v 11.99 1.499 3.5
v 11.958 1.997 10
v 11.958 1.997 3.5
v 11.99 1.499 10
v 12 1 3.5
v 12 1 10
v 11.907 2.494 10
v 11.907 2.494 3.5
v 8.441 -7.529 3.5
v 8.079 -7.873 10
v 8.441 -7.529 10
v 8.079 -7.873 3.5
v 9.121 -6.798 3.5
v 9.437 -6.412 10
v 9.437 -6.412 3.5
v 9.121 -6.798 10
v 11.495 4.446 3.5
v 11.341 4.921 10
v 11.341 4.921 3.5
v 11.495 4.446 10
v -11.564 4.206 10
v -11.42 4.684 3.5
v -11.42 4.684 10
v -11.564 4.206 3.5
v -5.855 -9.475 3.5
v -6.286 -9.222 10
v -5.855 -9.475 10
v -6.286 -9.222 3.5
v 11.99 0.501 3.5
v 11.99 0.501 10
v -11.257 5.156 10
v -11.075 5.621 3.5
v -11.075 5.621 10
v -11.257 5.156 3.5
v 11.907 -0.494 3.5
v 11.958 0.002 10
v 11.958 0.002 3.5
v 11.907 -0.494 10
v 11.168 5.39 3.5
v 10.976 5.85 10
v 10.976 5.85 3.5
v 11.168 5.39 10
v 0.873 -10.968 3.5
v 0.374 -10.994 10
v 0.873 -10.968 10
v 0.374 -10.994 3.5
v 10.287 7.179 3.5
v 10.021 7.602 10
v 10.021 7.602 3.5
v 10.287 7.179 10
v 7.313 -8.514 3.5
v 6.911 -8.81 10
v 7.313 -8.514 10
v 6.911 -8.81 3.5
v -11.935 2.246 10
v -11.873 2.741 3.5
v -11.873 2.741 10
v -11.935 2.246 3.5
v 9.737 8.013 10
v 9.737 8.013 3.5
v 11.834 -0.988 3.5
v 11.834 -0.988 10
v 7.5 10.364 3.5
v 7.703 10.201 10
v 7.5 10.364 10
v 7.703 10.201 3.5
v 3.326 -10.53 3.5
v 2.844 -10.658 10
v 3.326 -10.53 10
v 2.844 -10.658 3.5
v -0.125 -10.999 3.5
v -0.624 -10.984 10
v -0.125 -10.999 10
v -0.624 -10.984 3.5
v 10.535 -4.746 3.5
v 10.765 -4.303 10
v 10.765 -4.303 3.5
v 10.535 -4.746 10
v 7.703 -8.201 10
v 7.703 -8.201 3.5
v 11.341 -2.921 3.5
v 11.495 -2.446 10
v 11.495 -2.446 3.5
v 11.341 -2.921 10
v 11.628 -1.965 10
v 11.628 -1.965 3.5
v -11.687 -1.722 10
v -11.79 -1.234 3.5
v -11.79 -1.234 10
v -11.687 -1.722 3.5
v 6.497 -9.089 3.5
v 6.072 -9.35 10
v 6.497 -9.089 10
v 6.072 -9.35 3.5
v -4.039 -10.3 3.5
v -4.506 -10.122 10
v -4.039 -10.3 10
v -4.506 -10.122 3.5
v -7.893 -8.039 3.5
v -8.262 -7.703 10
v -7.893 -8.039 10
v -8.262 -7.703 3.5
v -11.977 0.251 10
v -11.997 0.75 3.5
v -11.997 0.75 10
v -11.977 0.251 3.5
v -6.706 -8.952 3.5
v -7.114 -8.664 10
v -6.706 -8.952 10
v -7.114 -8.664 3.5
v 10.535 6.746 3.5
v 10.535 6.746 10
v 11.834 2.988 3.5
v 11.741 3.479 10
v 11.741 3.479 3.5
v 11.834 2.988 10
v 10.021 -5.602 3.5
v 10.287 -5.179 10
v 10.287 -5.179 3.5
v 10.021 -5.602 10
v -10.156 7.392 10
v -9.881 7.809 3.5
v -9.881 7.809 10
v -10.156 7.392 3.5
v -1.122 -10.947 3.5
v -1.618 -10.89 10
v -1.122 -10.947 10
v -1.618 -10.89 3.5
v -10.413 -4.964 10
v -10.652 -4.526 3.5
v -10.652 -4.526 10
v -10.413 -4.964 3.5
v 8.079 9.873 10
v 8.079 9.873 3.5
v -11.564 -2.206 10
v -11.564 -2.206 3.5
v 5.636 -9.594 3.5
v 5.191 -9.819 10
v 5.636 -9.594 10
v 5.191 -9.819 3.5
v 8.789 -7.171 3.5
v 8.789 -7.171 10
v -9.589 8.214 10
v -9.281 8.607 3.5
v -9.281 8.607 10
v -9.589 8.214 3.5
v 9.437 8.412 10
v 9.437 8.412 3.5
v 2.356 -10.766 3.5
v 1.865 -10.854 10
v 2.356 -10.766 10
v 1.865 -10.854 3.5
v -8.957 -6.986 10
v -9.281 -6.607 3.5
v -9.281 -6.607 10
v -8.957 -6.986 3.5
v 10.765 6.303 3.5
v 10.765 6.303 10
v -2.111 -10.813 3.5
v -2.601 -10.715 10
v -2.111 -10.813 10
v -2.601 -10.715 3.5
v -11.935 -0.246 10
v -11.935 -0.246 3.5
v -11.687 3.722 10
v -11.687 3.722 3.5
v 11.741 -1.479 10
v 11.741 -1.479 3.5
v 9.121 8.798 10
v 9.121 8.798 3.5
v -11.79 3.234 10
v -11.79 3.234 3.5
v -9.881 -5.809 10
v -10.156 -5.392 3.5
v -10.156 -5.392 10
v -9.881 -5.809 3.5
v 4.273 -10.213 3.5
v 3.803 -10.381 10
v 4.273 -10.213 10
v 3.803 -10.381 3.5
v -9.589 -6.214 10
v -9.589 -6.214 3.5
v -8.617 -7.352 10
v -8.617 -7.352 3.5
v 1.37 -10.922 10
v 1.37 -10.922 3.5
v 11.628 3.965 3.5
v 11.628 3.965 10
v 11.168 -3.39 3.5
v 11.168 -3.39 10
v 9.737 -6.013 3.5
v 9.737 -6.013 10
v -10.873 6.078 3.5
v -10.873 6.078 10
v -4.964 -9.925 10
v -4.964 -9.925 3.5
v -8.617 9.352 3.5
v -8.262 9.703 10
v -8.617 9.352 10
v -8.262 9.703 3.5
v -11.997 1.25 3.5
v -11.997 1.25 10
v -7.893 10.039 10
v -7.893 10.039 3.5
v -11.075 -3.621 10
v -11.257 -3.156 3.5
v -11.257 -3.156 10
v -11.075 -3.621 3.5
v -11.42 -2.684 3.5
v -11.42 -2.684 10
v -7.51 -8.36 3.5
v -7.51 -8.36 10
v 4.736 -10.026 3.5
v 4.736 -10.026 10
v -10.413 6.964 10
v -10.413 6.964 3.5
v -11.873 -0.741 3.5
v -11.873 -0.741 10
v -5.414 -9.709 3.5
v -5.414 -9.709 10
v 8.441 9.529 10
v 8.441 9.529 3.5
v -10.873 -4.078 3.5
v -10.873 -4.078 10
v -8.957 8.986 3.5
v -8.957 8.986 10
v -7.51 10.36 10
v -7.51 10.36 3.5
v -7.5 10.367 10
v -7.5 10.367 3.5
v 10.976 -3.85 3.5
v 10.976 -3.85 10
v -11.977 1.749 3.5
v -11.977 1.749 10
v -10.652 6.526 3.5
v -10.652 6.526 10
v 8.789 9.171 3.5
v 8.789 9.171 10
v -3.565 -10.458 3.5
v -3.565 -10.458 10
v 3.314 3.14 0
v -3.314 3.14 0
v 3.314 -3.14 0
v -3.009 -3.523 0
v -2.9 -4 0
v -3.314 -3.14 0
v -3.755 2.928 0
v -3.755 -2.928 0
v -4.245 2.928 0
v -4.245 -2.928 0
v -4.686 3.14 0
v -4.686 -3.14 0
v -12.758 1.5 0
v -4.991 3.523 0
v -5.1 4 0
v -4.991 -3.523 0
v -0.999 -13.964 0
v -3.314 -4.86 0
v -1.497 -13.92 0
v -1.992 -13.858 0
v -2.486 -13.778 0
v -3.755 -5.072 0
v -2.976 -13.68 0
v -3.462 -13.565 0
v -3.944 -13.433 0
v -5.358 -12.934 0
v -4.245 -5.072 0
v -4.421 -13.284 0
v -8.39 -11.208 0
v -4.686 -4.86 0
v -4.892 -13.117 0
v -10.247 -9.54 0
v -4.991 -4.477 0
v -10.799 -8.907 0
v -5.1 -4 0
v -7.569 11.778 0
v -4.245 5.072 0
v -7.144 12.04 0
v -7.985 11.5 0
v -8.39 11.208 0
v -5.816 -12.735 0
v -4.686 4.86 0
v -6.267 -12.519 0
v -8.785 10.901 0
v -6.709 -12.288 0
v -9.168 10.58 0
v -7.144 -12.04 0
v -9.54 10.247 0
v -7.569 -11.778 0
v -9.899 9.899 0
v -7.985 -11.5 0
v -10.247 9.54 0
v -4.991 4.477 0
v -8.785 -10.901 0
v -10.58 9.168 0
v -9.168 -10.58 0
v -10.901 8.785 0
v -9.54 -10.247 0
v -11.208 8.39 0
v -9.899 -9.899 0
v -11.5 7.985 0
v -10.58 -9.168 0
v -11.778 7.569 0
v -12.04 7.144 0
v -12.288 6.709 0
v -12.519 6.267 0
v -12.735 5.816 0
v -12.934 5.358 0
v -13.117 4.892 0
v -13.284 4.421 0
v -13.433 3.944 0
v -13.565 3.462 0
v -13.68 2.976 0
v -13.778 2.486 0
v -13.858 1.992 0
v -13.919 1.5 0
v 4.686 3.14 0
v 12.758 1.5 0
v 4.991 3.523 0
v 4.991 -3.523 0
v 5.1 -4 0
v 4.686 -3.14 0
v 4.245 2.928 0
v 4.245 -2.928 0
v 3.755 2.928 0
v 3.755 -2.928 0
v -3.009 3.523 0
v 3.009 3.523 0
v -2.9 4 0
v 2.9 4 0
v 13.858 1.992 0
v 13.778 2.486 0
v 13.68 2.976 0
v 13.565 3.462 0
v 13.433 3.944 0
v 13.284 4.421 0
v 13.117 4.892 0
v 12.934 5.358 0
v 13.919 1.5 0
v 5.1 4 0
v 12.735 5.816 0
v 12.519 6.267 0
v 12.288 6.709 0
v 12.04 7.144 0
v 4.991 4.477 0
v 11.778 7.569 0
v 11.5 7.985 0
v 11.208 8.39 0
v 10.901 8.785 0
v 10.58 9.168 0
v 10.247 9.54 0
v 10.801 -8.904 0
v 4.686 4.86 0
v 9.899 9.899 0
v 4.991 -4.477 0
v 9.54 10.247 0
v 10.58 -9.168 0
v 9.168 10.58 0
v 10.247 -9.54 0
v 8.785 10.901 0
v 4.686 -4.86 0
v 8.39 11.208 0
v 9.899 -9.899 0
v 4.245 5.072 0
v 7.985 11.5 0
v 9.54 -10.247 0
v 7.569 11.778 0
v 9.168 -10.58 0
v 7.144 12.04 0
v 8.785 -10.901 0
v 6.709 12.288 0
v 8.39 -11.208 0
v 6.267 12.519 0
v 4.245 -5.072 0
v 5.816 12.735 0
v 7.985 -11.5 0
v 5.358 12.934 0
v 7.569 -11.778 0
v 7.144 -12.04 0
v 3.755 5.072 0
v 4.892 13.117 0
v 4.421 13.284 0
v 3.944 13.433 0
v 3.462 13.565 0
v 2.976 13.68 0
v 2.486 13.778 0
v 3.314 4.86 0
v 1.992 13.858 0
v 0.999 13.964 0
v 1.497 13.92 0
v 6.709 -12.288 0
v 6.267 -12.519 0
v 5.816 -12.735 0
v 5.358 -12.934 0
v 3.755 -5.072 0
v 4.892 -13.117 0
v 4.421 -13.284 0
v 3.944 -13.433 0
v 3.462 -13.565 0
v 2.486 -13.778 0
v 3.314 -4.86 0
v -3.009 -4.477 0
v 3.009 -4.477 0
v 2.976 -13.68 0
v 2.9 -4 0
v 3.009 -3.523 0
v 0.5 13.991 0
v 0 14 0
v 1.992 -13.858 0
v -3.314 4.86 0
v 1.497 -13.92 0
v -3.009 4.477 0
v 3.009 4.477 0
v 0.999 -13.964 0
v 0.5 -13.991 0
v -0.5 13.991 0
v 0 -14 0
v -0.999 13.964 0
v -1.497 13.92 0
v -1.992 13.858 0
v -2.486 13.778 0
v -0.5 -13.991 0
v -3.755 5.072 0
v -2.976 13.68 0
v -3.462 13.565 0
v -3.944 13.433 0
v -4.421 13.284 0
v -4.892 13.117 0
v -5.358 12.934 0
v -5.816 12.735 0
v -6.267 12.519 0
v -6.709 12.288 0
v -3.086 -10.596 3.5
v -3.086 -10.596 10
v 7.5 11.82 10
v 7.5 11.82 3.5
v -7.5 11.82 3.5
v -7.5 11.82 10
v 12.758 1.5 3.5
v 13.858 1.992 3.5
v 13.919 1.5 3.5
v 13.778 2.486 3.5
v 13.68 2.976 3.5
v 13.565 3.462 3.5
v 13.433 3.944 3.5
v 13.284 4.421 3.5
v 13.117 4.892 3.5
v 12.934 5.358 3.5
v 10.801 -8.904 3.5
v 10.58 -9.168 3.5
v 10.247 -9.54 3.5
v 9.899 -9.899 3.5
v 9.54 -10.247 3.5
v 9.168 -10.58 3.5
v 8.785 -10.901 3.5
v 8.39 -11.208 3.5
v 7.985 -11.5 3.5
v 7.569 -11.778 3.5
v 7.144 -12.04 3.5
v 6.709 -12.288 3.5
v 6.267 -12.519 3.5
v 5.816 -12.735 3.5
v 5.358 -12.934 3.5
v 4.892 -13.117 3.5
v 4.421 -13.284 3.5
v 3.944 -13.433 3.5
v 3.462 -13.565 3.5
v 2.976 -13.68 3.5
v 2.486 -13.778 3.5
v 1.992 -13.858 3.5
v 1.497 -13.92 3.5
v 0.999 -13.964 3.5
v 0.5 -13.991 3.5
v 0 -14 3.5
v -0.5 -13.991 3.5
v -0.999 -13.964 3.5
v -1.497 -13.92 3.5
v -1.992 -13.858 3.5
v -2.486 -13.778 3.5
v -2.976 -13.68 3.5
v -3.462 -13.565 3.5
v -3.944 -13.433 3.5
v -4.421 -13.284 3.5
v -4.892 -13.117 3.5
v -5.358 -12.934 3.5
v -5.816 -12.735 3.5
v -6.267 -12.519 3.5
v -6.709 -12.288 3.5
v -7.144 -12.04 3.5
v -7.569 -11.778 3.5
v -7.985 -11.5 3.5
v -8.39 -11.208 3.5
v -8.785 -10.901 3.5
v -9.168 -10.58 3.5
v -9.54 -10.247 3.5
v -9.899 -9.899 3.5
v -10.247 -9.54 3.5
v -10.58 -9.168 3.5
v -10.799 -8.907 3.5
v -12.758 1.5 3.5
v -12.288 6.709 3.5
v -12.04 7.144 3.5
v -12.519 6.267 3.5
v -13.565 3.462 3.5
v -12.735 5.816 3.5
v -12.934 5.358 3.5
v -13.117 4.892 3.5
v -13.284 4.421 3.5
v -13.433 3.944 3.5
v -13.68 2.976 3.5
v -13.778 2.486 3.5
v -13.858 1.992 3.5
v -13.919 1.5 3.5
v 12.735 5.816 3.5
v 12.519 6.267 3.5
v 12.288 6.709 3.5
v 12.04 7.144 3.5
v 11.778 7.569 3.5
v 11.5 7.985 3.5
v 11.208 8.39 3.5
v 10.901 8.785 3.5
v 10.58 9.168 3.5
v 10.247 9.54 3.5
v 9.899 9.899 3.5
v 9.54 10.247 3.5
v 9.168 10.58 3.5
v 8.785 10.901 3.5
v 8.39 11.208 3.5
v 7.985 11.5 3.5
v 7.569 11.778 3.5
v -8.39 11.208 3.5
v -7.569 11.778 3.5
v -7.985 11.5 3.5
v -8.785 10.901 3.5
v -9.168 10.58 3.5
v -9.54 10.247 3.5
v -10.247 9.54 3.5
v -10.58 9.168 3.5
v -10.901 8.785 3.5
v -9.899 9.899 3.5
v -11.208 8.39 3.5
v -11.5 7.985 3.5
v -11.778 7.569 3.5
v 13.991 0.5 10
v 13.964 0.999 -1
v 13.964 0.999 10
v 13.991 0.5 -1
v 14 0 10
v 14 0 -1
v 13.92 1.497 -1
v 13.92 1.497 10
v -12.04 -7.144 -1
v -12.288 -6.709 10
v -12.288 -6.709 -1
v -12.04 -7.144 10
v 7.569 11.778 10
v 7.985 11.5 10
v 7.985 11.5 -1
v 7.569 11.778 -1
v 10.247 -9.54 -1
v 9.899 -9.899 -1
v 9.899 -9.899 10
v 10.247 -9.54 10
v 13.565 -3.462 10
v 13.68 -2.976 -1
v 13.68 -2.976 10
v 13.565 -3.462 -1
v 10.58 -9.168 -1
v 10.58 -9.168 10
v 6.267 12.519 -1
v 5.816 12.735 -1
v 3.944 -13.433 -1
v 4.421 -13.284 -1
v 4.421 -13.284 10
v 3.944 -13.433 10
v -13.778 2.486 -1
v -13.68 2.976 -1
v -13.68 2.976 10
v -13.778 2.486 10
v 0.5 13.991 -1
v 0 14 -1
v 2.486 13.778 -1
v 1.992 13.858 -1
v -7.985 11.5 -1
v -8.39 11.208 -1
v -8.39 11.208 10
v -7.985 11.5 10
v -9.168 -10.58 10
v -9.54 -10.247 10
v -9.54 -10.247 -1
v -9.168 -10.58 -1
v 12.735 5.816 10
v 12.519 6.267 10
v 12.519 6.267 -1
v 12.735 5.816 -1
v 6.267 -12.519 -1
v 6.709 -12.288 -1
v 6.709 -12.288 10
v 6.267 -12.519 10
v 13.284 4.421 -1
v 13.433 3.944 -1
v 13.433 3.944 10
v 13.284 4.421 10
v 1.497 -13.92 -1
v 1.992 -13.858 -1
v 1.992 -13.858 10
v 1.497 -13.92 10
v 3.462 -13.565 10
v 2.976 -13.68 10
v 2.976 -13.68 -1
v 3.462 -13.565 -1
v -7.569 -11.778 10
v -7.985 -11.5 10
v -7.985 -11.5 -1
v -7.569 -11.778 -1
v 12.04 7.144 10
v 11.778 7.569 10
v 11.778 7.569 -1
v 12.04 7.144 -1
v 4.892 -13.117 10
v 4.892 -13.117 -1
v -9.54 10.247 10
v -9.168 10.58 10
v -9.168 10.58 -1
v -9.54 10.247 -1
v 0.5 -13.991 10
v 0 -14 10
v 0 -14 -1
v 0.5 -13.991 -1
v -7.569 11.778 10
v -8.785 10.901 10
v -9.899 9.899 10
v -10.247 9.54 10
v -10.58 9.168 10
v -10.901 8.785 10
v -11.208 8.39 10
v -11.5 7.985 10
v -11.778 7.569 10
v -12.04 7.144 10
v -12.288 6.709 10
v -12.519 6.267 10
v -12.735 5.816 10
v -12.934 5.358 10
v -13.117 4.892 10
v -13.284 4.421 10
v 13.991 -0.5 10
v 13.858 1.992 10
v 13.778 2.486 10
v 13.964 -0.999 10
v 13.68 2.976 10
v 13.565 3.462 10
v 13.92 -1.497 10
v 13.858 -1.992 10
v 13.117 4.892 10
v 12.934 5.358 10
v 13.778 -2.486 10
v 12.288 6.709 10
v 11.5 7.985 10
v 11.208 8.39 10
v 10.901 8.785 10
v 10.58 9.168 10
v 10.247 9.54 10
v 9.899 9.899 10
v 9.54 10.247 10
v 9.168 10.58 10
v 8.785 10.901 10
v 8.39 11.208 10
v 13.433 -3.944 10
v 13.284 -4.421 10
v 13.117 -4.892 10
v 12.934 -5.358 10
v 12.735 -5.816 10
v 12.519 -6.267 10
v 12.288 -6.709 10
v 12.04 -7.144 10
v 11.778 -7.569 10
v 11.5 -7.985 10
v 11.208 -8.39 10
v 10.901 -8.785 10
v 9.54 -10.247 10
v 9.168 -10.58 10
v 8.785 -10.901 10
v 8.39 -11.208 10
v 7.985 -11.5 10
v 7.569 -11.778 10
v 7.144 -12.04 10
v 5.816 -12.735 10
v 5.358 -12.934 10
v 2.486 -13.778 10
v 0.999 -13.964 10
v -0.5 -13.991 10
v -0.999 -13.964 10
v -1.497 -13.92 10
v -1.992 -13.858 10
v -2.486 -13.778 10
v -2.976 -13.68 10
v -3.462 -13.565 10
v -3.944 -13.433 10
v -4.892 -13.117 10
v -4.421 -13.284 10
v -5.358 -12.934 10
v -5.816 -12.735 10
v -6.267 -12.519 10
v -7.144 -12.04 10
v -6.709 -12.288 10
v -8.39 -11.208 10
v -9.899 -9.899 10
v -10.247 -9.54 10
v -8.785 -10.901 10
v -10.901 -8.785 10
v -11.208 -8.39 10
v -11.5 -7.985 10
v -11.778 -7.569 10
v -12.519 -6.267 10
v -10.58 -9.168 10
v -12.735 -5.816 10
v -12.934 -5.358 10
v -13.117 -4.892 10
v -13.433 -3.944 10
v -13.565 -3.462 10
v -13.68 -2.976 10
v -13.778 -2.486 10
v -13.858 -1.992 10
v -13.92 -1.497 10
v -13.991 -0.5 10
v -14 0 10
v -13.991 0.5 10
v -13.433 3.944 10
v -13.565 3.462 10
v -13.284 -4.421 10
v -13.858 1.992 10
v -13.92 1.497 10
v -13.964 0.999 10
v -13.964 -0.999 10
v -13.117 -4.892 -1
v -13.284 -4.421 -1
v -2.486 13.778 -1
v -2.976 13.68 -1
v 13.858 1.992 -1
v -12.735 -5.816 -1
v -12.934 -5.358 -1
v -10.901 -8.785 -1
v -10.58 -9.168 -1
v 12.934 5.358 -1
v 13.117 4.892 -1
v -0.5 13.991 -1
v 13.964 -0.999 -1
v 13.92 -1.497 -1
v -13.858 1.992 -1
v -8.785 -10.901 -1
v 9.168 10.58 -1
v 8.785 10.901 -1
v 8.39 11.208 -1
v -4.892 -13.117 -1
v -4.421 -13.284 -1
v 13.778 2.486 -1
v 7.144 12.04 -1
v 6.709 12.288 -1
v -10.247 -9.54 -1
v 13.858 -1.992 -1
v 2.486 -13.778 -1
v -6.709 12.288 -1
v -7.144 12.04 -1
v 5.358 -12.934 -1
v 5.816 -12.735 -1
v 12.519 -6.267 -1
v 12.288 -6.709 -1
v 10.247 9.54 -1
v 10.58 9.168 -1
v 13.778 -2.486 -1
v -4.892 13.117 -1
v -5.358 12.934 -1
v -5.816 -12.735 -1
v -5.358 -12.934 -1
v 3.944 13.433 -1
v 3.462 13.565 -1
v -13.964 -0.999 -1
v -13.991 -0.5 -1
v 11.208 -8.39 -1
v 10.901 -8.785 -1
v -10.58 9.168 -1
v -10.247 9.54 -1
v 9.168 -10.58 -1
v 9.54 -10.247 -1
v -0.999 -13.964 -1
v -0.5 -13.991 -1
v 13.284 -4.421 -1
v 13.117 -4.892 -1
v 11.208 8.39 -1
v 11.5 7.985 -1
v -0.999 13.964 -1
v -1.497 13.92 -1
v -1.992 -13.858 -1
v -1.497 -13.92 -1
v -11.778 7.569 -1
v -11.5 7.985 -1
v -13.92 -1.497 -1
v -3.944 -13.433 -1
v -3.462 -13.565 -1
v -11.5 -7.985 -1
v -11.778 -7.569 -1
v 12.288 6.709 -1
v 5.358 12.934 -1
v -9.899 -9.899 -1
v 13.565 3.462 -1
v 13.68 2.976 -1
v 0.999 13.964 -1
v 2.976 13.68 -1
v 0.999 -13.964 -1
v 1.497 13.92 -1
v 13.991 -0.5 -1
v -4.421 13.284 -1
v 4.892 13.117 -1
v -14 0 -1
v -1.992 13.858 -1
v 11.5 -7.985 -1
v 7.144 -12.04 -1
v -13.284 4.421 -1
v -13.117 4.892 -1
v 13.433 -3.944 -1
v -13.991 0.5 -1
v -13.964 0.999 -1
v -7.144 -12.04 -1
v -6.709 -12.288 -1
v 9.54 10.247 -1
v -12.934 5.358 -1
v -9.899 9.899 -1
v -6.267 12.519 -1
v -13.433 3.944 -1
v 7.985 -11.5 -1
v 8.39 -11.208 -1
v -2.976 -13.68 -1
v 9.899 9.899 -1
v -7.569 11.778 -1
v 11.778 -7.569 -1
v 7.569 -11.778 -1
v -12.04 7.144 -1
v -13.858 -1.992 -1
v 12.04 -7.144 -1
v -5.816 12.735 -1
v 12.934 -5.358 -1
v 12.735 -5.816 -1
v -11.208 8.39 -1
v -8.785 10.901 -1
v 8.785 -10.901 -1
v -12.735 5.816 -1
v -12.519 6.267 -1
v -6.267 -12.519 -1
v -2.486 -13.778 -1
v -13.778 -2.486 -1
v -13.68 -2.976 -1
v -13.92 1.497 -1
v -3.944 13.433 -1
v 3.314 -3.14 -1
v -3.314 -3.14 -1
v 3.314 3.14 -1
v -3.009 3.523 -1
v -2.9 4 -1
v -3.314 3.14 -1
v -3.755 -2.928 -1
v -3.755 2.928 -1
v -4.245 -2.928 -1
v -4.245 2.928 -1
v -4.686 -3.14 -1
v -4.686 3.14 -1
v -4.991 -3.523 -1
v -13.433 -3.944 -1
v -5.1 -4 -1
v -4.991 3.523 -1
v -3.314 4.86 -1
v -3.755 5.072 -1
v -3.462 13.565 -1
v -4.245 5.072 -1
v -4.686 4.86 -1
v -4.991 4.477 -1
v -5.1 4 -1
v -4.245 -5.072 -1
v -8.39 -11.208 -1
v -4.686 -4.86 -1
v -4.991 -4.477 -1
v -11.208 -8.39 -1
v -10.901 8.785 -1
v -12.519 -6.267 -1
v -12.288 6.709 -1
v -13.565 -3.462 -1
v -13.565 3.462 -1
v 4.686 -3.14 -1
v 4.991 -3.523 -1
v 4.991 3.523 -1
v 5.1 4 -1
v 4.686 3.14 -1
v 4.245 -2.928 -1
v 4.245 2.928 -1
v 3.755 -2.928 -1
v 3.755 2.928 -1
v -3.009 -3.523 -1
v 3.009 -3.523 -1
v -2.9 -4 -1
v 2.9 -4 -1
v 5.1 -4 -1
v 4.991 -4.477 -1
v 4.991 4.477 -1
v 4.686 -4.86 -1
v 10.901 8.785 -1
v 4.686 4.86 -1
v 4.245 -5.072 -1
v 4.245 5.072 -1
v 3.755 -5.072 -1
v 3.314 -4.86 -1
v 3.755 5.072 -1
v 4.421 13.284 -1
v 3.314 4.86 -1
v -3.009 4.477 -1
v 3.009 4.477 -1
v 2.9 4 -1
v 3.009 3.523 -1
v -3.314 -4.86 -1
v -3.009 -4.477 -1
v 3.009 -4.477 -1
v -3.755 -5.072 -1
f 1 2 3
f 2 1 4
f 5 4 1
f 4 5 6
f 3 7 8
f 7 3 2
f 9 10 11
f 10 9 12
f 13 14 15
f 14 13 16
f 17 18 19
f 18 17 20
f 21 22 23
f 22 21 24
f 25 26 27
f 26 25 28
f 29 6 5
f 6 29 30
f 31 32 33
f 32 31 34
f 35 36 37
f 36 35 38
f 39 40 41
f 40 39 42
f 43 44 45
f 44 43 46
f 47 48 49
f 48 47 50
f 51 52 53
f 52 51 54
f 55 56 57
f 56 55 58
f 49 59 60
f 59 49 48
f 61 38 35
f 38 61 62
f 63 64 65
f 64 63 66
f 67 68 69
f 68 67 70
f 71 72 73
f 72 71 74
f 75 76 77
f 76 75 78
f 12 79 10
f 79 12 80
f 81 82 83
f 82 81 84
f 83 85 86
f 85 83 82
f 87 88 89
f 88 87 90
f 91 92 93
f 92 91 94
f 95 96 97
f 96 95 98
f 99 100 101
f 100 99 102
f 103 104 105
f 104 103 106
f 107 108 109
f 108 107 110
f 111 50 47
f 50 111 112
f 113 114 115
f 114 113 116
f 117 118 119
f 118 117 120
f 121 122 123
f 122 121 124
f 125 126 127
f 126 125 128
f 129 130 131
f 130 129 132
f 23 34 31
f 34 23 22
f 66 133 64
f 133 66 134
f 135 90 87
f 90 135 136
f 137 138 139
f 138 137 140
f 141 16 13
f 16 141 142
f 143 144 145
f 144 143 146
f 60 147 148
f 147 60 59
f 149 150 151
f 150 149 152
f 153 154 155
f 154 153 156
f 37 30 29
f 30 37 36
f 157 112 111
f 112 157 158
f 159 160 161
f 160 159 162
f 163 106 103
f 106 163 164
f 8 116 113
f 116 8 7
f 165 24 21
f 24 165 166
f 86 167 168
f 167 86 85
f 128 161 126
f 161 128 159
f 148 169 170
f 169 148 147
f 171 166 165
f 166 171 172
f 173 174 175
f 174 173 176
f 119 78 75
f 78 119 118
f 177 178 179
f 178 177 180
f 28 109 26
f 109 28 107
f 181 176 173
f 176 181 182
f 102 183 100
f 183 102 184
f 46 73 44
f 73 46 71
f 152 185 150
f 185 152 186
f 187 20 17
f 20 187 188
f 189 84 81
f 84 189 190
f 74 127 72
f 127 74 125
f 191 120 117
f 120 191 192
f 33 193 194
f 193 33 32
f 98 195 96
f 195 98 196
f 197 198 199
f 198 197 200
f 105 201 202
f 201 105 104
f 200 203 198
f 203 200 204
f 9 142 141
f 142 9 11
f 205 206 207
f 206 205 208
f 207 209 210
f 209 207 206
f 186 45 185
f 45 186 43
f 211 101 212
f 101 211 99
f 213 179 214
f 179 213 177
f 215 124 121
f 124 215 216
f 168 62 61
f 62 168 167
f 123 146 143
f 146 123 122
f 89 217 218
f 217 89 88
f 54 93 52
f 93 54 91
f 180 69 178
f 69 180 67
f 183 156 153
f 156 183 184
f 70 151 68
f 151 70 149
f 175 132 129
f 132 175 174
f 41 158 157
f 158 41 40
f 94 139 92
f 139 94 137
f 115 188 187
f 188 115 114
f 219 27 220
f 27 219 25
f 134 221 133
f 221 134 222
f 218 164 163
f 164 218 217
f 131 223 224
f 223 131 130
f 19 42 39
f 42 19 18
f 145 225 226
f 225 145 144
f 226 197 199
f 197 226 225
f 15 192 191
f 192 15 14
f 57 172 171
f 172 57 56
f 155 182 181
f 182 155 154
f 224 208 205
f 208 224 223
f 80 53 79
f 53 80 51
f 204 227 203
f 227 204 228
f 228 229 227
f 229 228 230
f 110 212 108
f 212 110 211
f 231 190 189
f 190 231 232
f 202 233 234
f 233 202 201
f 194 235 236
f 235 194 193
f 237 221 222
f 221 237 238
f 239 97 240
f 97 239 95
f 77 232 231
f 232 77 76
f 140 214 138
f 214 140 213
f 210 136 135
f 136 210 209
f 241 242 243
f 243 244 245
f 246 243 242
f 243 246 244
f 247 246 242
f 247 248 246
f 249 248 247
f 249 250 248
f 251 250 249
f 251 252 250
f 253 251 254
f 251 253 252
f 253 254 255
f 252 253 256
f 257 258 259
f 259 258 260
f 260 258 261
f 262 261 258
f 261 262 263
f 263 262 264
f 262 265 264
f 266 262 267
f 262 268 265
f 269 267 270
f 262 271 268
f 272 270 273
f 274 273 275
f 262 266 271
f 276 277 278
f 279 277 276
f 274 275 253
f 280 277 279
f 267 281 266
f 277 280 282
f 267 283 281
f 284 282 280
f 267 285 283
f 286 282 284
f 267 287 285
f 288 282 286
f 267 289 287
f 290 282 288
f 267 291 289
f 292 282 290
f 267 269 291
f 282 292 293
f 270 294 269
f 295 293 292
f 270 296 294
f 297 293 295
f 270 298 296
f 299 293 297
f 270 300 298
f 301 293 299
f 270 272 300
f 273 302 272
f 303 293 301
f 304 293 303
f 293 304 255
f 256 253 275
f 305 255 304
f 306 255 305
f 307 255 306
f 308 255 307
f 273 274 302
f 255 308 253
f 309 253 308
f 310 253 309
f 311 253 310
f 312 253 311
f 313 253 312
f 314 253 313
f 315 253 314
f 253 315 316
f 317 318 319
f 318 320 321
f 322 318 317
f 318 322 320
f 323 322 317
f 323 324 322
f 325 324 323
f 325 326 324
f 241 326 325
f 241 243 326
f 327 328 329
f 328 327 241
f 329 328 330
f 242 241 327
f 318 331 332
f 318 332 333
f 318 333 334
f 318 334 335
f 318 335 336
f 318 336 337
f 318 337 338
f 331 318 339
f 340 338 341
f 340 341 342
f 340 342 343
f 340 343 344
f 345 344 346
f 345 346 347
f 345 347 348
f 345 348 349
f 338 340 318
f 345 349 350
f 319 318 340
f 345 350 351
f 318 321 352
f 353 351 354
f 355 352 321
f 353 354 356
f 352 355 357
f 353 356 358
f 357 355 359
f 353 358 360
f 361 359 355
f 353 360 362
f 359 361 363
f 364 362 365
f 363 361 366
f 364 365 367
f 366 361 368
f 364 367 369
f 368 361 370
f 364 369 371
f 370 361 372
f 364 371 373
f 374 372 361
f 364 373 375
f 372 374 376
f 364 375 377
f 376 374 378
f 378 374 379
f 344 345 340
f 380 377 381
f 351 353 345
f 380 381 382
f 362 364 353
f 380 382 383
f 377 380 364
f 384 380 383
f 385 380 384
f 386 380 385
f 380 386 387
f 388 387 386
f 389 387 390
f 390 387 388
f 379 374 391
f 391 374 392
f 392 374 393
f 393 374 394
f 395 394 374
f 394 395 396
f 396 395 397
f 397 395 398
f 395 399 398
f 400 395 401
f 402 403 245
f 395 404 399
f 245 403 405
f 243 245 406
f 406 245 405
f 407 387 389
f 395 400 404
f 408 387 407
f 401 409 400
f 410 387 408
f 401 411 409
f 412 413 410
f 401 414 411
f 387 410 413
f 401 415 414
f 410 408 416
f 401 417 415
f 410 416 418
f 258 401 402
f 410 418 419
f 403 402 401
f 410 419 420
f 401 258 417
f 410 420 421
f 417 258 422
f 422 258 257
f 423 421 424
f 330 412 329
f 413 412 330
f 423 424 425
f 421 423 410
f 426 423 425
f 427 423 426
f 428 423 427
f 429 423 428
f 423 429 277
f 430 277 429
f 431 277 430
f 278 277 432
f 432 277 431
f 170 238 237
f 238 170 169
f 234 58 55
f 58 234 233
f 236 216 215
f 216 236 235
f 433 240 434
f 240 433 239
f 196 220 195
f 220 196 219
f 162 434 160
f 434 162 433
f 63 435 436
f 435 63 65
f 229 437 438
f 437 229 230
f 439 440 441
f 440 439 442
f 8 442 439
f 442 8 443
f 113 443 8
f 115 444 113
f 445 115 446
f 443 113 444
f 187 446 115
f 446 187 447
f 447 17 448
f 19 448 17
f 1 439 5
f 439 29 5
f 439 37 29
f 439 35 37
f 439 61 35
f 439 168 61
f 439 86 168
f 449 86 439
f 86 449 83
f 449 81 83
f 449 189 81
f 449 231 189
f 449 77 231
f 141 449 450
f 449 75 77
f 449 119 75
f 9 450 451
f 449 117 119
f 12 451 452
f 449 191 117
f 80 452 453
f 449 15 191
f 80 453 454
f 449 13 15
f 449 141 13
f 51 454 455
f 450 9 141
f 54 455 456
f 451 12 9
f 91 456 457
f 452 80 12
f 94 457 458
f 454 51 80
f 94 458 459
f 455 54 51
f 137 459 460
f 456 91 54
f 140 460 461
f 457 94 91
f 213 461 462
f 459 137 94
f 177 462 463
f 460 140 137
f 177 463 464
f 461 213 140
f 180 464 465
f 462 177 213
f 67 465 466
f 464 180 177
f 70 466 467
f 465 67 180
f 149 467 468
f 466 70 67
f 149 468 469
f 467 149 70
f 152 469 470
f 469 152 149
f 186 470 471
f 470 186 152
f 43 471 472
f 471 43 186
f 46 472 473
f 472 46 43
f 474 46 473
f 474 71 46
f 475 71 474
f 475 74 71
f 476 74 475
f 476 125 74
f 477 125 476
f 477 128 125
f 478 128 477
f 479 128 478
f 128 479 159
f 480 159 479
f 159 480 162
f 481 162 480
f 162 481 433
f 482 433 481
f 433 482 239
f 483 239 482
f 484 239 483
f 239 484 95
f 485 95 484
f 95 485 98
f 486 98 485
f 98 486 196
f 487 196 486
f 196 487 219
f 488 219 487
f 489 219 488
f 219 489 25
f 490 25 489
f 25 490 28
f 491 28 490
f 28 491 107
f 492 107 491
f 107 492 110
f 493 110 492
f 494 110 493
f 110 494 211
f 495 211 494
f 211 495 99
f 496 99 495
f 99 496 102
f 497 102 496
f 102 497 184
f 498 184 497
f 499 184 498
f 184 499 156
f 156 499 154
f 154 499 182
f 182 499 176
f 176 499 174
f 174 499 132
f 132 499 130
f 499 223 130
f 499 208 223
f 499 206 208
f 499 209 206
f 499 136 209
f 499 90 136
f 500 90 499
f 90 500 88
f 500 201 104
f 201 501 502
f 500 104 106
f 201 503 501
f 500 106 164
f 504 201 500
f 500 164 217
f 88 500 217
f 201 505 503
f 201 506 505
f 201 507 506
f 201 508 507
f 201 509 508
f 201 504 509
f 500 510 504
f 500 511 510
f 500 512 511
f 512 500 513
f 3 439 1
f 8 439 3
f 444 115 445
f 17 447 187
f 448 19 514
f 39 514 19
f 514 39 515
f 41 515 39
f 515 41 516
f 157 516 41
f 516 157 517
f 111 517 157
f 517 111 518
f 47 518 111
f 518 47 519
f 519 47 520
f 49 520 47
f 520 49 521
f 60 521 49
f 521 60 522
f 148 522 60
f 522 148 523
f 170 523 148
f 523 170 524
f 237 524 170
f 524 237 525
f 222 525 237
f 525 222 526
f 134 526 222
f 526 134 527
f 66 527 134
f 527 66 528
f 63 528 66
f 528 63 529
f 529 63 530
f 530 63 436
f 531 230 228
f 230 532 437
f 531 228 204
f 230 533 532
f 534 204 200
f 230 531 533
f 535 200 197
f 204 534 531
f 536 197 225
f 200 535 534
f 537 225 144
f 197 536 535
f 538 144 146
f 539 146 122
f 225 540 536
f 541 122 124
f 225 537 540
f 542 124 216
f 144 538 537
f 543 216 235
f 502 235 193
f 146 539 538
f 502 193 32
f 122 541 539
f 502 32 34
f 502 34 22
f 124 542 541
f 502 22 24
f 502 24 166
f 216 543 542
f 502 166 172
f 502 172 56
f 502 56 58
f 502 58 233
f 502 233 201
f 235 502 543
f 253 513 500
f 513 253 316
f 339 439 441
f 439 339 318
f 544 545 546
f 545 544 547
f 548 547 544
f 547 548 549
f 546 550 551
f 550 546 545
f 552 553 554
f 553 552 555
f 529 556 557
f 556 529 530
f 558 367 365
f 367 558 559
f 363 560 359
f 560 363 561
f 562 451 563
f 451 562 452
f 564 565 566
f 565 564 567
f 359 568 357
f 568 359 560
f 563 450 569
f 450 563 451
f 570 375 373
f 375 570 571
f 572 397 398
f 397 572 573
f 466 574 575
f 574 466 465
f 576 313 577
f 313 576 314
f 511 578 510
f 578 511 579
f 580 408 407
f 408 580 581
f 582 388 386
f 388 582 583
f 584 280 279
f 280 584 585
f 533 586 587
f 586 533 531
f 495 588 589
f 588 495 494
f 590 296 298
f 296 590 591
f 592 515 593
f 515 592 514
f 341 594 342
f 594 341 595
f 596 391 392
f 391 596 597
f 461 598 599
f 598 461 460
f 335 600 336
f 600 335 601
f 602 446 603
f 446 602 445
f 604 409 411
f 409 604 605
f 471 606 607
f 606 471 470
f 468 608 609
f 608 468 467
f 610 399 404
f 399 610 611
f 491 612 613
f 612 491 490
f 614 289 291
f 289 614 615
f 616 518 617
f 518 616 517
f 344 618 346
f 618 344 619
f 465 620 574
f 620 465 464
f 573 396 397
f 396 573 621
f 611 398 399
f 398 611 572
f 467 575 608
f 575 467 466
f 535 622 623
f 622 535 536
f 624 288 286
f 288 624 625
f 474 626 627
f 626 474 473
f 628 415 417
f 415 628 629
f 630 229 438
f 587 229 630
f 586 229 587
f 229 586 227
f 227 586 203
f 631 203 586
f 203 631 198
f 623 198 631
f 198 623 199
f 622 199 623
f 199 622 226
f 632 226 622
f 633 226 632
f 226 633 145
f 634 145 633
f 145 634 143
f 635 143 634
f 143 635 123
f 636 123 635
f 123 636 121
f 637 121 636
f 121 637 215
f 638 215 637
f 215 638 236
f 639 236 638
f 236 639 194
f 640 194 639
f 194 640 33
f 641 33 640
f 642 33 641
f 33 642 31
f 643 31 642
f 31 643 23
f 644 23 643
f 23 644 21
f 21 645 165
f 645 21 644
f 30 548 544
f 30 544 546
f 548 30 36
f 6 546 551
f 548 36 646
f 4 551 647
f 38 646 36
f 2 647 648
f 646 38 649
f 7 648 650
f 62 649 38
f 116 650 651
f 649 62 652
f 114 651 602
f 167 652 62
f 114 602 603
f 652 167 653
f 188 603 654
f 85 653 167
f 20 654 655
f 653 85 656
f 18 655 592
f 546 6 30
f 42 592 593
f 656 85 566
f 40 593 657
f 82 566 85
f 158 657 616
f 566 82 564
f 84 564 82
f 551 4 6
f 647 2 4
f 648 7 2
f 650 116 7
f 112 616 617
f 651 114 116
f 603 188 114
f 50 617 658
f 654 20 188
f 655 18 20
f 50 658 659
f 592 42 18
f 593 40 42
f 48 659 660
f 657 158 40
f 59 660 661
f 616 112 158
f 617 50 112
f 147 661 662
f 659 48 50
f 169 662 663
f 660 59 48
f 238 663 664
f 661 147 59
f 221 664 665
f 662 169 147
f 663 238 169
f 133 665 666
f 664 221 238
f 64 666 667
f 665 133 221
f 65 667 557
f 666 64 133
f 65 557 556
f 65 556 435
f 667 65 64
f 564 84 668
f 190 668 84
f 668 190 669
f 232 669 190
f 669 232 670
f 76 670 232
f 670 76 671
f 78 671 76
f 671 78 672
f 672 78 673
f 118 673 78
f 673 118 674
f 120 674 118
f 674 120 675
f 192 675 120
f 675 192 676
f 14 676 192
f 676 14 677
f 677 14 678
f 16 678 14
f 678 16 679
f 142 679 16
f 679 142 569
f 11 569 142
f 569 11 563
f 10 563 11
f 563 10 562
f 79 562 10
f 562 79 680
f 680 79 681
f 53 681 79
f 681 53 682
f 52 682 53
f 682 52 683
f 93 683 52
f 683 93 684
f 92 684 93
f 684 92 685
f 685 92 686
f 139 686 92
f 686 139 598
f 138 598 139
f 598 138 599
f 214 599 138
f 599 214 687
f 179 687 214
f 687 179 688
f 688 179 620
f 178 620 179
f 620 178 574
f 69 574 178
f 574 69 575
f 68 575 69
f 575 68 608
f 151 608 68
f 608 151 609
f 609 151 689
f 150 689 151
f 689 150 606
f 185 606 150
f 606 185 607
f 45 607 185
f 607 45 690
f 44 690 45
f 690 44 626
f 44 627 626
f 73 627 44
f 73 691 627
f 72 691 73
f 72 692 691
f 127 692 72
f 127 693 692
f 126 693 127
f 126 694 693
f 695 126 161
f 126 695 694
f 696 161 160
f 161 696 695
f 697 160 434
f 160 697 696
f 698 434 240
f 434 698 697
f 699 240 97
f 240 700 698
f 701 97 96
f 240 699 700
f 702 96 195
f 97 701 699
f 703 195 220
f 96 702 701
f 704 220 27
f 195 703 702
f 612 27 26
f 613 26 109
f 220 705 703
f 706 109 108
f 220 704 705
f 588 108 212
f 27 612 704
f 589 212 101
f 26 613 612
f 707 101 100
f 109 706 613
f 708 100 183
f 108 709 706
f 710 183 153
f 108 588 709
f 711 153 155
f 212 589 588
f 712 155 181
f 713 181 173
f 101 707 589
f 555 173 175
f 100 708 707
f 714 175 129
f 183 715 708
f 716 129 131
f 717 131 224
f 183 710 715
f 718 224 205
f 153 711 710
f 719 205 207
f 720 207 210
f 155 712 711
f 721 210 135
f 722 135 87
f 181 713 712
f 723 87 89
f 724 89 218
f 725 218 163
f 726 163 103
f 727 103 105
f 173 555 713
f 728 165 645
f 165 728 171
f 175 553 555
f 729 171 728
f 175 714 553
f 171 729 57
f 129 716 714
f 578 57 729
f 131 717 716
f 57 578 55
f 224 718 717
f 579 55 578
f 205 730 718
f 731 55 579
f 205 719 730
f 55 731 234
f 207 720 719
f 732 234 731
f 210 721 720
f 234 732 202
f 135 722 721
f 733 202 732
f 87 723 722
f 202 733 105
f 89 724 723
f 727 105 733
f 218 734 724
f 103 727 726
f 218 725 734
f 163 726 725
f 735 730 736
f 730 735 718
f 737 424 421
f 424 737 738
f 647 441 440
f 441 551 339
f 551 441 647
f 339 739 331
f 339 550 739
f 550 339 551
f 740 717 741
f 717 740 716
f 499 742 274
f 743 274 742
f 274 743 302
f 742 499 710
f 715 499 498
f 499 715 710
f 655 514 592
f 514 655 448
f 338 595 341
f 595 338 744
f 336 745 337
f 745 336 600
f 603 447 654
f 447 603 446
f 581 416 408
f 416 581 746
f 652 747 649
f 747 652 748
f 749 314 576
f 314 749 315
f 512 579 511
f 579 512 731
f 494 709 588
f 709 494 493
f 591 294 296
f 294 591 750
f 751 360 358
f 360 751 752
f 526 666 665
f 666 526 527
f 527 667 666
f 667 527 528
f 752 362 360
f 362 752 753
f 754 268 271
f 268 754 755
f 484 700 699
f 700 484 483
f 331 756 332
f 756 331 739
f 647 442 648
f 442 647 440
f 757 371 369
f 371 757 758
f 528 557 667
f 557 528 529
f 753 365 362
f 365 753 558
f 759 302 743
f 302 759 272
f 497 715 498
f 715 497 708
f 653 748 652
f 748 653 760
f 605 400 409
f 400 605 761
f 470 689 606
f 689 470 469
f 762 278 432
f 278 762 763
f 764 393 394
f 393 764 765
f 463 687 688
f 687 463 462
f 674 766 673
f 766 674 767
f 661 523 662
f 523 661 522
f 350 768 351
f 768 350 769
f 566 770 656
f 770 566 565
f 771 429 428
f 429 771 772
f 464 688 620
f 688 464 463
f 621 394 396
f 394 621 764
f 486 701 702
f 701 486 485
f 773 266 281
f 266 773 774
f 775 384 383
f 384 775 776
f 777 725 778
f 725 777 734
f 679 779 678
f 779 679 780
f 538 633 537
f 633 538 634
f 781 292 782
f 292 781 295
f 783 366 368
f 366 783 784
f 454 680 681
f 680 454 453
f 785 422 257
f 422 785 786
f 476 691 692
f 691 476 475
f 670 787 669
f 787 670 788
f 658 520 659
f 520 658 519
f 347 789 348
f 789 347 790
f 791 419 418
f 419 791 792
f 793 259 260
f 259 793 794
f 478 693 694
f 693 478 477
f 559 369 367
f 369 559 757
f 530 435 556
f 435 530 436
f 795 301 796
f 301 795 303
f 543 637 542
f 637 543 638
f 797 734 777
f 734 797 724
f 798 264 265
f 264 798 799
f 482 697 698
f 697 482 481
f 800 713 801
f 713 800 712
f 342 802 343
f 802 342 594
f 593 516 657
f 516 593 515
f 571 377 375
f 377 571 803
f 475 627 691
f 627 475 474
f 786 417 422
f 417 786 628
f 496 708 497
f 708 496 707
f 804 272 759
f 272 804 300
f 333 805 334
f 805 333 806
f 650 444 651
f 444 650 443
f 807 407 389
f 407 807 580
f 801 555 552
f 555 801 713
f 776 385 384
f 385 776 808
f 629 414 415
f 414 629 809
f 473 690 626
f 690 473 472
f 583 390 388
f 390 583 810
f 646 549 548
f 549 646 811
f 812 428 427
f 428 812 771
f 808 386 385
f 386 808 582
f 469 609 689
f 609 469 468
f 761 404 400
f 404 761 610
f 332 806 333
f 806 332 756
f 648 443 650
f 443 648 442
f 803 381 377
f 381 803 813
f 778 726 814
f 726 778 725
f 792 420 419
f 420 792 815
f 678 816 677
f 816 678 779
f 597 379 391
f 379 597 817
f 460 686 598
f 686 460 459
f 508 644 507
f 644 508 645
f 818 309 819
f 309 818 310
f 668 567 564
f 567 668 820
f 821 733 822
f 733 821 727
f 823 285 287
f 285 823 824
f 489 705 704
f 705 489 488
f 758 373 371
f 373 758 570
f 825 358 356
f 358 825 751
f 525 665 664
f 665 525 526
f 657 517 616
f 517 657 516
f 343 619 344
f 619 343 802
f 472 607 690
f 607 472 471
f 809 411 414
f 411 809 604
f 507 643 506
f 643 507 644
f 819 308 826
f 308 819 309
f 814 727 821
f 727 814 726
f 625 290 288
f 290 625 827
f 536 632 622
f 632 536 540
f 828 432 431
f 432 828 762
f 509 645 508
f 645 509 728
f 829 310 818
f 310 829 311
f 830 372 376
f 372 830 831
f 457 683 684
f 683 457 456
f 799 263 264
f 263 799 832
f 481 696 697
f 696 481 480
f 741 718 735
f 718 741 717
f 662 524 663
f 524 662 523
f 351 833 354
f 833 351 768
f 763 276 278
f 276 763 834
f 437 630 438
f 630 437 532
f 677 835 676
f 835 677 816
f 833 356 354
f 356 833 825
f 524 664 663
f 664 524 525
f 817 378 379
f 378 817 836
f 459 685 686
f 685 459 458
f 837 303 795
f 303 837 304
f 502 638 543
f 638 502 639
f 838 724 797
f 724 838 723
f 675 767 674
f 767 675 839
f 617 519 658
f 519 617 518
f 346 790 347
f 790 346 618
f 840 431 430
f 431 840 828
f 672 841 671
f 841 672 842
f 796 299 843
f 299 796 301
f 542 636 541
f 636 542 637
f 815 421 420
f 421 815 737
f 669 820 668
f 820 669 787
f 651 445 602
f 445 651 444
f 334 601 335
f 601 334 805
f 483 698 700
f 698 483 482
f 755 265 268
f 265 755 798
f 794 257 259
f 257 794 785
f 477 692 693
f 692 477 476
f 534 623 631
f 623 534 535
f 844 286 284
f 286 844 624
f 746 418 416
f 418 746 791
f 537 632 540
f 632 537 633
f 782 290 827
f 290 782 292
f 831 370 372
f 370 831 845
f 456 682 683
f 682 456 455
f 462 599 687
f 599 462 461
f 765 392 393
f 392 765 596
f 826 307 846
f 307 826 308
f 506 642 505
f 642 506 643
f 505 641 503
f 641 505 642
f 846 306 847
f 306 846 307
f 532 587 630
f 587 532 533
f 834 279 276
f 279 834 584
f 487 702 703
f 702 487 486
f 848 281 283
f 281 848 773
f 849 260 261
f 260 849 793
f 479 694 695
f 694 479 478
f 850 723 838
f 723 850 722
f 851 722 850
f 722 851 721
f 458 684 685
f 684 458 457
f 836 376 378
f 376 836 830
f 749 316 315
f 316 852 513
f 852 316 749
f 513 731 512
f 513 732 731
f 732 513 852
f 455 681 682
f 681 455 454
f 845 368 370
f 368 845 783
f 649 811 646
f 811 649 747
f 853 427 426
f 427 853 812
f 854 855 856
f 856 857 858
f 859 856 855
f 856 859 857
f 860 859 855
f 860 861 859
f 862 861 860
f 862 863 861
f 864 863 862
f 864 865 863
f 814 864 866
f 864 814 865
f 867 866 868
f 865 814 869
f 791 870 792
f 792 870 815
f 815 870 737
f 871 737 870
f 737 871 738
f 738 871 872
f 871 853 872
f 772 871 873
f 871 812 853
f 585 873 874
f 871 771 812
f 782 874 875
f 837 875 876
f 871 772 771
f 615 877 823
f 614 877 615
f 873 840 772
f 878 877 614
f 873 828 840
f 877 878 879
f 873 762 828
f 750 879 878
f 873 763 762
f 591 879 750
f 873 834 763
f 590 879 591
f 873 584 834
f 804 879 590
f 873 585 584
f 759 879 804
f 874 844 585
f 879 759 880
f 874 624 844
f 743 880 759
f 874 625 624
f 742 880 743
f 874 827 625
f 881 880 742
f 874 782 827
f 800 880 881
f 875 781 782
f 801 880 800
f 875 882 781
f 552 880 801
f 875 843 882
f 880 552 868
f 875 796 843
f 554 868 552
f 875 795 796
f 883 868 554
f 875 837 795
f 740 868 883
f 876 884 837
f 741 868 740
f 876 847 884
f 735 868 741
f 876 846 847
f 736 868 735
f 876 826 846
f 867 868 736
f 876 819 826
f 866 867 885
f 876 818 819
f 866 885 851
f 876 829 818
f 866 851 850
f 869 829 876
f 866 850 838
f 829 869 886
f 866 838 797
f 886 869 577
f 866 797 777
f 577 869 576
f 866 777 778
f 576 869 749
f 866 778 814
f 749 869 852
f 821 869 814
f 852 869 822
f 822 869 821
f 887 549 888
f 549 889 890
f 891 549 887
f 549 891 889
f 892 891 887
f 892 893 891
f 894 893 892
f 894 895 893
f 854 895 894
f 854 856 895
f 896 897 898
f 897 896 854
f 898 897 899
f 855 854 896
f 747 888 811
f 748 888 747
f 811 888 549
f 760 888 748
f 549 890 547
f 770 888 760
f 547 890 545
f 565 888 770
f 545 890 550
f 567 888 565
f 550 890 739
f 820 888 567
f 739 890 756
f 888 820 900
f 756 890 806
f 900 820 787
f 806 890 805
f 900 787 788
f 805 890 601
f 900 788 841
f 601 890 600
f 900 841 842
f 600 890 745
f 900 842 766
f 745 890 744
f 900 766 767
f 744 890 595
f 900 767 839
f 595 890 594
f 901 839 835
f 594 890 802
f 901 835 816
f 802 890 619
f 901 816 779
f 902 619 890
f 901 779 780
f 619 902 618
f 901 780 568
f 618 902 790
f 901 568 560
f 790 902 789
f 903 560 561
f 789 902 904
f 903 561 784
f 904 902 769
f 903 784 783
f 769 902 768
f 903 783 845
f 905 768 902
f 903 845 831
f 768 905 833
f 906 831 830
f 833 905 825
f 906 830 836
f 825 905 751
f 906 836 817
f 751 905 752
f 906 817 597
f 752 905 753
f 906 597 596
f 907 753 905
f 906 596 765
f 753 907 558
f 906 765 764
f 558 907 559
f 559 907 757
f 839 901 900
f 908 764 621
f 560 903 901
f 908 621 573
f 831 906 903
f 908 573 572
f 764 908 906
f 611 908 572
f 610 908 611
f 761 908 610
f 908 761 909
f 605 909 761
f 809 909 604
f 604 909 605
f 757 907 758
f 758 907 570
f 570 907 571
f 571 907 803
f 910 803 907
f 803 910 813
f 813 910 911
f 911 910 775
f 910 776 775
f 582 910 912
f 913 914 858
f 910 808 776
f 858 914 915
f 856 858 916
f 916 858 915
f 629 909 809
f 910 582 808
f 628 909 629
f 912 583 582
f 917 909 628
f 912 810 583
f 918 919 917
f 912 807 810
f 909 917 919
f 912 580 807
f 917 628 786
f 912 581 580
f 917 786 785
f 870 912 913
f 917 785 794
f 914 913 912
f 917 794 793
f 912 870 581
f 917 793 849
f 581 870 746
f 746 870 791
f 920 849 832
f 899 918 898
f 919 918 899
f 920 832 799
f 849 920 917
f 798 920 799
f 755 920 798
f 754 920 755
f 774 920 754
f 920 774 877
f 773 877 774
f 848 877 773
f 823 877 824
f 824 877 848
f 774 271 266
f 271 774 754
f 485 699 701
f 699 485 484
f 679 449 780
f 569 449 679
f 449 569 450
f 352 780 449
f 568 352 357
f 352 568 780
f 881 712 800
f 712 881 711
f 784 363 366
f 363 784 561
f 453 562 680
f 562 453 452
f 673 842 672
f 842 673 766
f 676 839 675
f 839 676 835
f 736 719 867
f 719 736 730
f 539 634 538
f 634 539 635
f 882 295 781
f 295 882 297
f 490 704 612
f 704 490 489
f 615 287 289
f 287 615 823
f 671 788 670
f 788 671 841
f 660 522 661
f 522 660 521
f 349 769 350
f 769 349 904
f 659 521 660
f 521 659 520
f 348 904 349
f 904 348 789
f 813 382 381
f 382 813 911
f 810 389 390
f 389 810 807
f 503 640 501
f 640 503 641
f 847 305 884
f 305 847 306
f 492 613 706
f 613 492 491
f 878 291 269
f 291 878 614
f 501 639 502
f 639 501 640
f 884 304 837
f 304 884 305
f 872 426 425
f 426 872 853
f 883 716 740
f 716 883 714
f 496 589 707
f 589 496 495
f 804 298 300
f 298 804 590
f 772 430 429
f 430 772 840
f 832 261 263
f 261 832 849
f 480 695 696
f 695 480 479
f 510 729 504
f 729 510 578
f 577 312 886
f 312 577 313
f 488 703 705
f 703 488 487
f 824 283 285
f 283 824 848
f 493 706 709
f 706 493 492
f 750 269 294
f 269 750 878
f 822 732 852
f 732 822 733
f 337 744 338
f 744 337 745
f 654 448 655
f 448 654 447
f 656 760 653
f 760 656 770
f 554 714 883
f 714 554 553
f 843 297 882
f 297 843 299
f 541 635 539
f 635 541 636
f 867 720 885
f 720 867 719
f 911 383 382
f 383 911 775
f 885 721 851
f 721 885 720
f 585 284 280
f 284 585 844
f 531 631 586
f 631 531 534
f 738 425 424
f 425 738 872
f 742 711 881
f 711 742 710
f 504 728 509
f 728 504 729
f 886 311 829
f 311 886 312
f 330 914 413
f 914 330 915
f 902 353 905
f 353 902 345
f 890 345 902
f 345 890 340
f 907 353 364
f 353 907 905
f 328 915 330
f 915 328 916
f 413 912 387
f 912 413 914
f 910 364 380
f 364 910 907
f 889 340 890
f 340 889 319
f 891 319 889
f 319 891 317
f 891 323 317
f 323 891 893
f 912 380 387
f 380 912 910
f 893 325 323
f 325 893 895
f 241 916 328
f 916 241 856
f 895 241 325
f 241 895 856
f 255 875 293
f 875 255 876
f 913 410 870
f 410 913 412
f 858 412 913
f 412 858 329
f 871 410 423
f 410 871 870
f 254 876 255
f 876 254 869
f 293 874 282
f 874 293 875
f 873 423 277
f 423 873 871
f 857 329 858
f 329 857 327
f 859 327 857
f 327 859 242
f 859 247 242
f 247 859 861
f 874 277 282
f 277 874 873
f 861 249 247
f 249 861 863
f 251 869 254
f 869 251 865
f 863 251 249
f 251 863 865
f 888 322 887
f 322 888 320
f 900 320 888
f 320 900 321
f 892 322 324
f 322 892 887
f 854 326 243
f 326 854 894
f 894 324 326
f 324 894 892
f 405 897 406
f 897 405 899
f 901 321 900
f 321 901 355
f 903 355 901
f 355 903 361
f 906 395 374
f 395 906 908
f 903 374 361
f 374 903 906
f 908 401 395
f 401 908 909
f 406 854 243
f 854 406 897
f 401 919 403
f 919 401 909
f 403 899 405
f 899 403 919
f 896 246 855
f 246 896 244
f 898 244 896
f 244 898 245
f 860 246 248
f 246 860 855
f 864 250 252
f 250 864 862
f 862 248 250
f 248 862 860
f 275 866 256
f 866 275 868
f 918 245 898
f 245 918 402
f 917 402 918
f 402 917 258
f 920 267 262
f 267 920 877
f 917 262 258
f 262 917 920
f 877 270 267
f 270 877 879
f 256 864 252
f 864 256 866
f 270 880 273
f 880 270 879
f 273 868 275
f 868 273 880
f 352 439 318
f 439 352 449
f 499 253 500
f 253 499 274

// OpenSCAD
$fa=0.5;
$fs=0.5;

armheight=3.5;

module arm() {
  union() {
//  difference() {
    union() {
      hull(){
        translate([-9.8, 2.0, 0])
          cylinder(r=3, h=armheight);
        translate([9.8, 2.0, 0])
          cylinder(r=3, h=armheight);
        
        translate([-5, -12.7, 0])      
          cylinder(r=5, h=armheight);
        translate([5, -12.7, 0])      
          cylinder(r=5, h=armheight);
        
        translate([-9.5, 0, 0])
          cube([19, 10, armheight]);
      }
      
      translate([-9.5, 10, 0])
        cube([19, 40, armheight]);
    }
//    union() {
//      translate([0, 0, -0.1])
//        cylinder(r=3, h=armheight + 1);
//      translate([0, -7.7, -0.1])
//        cylinder(r=3.5, h=armheight + 1);
//      translate([4, 4, 0])
//        cylinder(r=1, h=armheight +1);
//      translate([-4, 4, 0])
//        cylinder(r=1, h=armheight +1);
//      translate([4, -4, 0])
//        cylinder(r=1, h=armheight +1);
//      translate([-4, -4, 0])
//        cylinder(r=1, h=armheight +1);
//    }
//  }
  }
}

difference() {
  difference() {
  translate([0, 0, -1])
    difference() {
      cylinder(r=14, h=11);
      union() {
        translate([0, 1, 1])
          cylinder(r=12, h=11);
        translate([-7.5, 8, 1])
          cube([15, 10, 11]);
        translate([-15, 1.5, 1])
          cube([30, 30, armheight]);
      }  
    }
    union() {
      translate([4, 4, -3])
        cylinder(r=1.1, h=armheight +3);
      translate([-4, 4, -3])
        cylinder(r=1.1, h=armheight +3);
      translate([4, -4, -3])
        cylinder(r=1.1, h=armheight +3);
      translate([-4, -4, -3])
        cylinder(r=1.1, h=armheight +3);
    }
  }
  #arm();
}
